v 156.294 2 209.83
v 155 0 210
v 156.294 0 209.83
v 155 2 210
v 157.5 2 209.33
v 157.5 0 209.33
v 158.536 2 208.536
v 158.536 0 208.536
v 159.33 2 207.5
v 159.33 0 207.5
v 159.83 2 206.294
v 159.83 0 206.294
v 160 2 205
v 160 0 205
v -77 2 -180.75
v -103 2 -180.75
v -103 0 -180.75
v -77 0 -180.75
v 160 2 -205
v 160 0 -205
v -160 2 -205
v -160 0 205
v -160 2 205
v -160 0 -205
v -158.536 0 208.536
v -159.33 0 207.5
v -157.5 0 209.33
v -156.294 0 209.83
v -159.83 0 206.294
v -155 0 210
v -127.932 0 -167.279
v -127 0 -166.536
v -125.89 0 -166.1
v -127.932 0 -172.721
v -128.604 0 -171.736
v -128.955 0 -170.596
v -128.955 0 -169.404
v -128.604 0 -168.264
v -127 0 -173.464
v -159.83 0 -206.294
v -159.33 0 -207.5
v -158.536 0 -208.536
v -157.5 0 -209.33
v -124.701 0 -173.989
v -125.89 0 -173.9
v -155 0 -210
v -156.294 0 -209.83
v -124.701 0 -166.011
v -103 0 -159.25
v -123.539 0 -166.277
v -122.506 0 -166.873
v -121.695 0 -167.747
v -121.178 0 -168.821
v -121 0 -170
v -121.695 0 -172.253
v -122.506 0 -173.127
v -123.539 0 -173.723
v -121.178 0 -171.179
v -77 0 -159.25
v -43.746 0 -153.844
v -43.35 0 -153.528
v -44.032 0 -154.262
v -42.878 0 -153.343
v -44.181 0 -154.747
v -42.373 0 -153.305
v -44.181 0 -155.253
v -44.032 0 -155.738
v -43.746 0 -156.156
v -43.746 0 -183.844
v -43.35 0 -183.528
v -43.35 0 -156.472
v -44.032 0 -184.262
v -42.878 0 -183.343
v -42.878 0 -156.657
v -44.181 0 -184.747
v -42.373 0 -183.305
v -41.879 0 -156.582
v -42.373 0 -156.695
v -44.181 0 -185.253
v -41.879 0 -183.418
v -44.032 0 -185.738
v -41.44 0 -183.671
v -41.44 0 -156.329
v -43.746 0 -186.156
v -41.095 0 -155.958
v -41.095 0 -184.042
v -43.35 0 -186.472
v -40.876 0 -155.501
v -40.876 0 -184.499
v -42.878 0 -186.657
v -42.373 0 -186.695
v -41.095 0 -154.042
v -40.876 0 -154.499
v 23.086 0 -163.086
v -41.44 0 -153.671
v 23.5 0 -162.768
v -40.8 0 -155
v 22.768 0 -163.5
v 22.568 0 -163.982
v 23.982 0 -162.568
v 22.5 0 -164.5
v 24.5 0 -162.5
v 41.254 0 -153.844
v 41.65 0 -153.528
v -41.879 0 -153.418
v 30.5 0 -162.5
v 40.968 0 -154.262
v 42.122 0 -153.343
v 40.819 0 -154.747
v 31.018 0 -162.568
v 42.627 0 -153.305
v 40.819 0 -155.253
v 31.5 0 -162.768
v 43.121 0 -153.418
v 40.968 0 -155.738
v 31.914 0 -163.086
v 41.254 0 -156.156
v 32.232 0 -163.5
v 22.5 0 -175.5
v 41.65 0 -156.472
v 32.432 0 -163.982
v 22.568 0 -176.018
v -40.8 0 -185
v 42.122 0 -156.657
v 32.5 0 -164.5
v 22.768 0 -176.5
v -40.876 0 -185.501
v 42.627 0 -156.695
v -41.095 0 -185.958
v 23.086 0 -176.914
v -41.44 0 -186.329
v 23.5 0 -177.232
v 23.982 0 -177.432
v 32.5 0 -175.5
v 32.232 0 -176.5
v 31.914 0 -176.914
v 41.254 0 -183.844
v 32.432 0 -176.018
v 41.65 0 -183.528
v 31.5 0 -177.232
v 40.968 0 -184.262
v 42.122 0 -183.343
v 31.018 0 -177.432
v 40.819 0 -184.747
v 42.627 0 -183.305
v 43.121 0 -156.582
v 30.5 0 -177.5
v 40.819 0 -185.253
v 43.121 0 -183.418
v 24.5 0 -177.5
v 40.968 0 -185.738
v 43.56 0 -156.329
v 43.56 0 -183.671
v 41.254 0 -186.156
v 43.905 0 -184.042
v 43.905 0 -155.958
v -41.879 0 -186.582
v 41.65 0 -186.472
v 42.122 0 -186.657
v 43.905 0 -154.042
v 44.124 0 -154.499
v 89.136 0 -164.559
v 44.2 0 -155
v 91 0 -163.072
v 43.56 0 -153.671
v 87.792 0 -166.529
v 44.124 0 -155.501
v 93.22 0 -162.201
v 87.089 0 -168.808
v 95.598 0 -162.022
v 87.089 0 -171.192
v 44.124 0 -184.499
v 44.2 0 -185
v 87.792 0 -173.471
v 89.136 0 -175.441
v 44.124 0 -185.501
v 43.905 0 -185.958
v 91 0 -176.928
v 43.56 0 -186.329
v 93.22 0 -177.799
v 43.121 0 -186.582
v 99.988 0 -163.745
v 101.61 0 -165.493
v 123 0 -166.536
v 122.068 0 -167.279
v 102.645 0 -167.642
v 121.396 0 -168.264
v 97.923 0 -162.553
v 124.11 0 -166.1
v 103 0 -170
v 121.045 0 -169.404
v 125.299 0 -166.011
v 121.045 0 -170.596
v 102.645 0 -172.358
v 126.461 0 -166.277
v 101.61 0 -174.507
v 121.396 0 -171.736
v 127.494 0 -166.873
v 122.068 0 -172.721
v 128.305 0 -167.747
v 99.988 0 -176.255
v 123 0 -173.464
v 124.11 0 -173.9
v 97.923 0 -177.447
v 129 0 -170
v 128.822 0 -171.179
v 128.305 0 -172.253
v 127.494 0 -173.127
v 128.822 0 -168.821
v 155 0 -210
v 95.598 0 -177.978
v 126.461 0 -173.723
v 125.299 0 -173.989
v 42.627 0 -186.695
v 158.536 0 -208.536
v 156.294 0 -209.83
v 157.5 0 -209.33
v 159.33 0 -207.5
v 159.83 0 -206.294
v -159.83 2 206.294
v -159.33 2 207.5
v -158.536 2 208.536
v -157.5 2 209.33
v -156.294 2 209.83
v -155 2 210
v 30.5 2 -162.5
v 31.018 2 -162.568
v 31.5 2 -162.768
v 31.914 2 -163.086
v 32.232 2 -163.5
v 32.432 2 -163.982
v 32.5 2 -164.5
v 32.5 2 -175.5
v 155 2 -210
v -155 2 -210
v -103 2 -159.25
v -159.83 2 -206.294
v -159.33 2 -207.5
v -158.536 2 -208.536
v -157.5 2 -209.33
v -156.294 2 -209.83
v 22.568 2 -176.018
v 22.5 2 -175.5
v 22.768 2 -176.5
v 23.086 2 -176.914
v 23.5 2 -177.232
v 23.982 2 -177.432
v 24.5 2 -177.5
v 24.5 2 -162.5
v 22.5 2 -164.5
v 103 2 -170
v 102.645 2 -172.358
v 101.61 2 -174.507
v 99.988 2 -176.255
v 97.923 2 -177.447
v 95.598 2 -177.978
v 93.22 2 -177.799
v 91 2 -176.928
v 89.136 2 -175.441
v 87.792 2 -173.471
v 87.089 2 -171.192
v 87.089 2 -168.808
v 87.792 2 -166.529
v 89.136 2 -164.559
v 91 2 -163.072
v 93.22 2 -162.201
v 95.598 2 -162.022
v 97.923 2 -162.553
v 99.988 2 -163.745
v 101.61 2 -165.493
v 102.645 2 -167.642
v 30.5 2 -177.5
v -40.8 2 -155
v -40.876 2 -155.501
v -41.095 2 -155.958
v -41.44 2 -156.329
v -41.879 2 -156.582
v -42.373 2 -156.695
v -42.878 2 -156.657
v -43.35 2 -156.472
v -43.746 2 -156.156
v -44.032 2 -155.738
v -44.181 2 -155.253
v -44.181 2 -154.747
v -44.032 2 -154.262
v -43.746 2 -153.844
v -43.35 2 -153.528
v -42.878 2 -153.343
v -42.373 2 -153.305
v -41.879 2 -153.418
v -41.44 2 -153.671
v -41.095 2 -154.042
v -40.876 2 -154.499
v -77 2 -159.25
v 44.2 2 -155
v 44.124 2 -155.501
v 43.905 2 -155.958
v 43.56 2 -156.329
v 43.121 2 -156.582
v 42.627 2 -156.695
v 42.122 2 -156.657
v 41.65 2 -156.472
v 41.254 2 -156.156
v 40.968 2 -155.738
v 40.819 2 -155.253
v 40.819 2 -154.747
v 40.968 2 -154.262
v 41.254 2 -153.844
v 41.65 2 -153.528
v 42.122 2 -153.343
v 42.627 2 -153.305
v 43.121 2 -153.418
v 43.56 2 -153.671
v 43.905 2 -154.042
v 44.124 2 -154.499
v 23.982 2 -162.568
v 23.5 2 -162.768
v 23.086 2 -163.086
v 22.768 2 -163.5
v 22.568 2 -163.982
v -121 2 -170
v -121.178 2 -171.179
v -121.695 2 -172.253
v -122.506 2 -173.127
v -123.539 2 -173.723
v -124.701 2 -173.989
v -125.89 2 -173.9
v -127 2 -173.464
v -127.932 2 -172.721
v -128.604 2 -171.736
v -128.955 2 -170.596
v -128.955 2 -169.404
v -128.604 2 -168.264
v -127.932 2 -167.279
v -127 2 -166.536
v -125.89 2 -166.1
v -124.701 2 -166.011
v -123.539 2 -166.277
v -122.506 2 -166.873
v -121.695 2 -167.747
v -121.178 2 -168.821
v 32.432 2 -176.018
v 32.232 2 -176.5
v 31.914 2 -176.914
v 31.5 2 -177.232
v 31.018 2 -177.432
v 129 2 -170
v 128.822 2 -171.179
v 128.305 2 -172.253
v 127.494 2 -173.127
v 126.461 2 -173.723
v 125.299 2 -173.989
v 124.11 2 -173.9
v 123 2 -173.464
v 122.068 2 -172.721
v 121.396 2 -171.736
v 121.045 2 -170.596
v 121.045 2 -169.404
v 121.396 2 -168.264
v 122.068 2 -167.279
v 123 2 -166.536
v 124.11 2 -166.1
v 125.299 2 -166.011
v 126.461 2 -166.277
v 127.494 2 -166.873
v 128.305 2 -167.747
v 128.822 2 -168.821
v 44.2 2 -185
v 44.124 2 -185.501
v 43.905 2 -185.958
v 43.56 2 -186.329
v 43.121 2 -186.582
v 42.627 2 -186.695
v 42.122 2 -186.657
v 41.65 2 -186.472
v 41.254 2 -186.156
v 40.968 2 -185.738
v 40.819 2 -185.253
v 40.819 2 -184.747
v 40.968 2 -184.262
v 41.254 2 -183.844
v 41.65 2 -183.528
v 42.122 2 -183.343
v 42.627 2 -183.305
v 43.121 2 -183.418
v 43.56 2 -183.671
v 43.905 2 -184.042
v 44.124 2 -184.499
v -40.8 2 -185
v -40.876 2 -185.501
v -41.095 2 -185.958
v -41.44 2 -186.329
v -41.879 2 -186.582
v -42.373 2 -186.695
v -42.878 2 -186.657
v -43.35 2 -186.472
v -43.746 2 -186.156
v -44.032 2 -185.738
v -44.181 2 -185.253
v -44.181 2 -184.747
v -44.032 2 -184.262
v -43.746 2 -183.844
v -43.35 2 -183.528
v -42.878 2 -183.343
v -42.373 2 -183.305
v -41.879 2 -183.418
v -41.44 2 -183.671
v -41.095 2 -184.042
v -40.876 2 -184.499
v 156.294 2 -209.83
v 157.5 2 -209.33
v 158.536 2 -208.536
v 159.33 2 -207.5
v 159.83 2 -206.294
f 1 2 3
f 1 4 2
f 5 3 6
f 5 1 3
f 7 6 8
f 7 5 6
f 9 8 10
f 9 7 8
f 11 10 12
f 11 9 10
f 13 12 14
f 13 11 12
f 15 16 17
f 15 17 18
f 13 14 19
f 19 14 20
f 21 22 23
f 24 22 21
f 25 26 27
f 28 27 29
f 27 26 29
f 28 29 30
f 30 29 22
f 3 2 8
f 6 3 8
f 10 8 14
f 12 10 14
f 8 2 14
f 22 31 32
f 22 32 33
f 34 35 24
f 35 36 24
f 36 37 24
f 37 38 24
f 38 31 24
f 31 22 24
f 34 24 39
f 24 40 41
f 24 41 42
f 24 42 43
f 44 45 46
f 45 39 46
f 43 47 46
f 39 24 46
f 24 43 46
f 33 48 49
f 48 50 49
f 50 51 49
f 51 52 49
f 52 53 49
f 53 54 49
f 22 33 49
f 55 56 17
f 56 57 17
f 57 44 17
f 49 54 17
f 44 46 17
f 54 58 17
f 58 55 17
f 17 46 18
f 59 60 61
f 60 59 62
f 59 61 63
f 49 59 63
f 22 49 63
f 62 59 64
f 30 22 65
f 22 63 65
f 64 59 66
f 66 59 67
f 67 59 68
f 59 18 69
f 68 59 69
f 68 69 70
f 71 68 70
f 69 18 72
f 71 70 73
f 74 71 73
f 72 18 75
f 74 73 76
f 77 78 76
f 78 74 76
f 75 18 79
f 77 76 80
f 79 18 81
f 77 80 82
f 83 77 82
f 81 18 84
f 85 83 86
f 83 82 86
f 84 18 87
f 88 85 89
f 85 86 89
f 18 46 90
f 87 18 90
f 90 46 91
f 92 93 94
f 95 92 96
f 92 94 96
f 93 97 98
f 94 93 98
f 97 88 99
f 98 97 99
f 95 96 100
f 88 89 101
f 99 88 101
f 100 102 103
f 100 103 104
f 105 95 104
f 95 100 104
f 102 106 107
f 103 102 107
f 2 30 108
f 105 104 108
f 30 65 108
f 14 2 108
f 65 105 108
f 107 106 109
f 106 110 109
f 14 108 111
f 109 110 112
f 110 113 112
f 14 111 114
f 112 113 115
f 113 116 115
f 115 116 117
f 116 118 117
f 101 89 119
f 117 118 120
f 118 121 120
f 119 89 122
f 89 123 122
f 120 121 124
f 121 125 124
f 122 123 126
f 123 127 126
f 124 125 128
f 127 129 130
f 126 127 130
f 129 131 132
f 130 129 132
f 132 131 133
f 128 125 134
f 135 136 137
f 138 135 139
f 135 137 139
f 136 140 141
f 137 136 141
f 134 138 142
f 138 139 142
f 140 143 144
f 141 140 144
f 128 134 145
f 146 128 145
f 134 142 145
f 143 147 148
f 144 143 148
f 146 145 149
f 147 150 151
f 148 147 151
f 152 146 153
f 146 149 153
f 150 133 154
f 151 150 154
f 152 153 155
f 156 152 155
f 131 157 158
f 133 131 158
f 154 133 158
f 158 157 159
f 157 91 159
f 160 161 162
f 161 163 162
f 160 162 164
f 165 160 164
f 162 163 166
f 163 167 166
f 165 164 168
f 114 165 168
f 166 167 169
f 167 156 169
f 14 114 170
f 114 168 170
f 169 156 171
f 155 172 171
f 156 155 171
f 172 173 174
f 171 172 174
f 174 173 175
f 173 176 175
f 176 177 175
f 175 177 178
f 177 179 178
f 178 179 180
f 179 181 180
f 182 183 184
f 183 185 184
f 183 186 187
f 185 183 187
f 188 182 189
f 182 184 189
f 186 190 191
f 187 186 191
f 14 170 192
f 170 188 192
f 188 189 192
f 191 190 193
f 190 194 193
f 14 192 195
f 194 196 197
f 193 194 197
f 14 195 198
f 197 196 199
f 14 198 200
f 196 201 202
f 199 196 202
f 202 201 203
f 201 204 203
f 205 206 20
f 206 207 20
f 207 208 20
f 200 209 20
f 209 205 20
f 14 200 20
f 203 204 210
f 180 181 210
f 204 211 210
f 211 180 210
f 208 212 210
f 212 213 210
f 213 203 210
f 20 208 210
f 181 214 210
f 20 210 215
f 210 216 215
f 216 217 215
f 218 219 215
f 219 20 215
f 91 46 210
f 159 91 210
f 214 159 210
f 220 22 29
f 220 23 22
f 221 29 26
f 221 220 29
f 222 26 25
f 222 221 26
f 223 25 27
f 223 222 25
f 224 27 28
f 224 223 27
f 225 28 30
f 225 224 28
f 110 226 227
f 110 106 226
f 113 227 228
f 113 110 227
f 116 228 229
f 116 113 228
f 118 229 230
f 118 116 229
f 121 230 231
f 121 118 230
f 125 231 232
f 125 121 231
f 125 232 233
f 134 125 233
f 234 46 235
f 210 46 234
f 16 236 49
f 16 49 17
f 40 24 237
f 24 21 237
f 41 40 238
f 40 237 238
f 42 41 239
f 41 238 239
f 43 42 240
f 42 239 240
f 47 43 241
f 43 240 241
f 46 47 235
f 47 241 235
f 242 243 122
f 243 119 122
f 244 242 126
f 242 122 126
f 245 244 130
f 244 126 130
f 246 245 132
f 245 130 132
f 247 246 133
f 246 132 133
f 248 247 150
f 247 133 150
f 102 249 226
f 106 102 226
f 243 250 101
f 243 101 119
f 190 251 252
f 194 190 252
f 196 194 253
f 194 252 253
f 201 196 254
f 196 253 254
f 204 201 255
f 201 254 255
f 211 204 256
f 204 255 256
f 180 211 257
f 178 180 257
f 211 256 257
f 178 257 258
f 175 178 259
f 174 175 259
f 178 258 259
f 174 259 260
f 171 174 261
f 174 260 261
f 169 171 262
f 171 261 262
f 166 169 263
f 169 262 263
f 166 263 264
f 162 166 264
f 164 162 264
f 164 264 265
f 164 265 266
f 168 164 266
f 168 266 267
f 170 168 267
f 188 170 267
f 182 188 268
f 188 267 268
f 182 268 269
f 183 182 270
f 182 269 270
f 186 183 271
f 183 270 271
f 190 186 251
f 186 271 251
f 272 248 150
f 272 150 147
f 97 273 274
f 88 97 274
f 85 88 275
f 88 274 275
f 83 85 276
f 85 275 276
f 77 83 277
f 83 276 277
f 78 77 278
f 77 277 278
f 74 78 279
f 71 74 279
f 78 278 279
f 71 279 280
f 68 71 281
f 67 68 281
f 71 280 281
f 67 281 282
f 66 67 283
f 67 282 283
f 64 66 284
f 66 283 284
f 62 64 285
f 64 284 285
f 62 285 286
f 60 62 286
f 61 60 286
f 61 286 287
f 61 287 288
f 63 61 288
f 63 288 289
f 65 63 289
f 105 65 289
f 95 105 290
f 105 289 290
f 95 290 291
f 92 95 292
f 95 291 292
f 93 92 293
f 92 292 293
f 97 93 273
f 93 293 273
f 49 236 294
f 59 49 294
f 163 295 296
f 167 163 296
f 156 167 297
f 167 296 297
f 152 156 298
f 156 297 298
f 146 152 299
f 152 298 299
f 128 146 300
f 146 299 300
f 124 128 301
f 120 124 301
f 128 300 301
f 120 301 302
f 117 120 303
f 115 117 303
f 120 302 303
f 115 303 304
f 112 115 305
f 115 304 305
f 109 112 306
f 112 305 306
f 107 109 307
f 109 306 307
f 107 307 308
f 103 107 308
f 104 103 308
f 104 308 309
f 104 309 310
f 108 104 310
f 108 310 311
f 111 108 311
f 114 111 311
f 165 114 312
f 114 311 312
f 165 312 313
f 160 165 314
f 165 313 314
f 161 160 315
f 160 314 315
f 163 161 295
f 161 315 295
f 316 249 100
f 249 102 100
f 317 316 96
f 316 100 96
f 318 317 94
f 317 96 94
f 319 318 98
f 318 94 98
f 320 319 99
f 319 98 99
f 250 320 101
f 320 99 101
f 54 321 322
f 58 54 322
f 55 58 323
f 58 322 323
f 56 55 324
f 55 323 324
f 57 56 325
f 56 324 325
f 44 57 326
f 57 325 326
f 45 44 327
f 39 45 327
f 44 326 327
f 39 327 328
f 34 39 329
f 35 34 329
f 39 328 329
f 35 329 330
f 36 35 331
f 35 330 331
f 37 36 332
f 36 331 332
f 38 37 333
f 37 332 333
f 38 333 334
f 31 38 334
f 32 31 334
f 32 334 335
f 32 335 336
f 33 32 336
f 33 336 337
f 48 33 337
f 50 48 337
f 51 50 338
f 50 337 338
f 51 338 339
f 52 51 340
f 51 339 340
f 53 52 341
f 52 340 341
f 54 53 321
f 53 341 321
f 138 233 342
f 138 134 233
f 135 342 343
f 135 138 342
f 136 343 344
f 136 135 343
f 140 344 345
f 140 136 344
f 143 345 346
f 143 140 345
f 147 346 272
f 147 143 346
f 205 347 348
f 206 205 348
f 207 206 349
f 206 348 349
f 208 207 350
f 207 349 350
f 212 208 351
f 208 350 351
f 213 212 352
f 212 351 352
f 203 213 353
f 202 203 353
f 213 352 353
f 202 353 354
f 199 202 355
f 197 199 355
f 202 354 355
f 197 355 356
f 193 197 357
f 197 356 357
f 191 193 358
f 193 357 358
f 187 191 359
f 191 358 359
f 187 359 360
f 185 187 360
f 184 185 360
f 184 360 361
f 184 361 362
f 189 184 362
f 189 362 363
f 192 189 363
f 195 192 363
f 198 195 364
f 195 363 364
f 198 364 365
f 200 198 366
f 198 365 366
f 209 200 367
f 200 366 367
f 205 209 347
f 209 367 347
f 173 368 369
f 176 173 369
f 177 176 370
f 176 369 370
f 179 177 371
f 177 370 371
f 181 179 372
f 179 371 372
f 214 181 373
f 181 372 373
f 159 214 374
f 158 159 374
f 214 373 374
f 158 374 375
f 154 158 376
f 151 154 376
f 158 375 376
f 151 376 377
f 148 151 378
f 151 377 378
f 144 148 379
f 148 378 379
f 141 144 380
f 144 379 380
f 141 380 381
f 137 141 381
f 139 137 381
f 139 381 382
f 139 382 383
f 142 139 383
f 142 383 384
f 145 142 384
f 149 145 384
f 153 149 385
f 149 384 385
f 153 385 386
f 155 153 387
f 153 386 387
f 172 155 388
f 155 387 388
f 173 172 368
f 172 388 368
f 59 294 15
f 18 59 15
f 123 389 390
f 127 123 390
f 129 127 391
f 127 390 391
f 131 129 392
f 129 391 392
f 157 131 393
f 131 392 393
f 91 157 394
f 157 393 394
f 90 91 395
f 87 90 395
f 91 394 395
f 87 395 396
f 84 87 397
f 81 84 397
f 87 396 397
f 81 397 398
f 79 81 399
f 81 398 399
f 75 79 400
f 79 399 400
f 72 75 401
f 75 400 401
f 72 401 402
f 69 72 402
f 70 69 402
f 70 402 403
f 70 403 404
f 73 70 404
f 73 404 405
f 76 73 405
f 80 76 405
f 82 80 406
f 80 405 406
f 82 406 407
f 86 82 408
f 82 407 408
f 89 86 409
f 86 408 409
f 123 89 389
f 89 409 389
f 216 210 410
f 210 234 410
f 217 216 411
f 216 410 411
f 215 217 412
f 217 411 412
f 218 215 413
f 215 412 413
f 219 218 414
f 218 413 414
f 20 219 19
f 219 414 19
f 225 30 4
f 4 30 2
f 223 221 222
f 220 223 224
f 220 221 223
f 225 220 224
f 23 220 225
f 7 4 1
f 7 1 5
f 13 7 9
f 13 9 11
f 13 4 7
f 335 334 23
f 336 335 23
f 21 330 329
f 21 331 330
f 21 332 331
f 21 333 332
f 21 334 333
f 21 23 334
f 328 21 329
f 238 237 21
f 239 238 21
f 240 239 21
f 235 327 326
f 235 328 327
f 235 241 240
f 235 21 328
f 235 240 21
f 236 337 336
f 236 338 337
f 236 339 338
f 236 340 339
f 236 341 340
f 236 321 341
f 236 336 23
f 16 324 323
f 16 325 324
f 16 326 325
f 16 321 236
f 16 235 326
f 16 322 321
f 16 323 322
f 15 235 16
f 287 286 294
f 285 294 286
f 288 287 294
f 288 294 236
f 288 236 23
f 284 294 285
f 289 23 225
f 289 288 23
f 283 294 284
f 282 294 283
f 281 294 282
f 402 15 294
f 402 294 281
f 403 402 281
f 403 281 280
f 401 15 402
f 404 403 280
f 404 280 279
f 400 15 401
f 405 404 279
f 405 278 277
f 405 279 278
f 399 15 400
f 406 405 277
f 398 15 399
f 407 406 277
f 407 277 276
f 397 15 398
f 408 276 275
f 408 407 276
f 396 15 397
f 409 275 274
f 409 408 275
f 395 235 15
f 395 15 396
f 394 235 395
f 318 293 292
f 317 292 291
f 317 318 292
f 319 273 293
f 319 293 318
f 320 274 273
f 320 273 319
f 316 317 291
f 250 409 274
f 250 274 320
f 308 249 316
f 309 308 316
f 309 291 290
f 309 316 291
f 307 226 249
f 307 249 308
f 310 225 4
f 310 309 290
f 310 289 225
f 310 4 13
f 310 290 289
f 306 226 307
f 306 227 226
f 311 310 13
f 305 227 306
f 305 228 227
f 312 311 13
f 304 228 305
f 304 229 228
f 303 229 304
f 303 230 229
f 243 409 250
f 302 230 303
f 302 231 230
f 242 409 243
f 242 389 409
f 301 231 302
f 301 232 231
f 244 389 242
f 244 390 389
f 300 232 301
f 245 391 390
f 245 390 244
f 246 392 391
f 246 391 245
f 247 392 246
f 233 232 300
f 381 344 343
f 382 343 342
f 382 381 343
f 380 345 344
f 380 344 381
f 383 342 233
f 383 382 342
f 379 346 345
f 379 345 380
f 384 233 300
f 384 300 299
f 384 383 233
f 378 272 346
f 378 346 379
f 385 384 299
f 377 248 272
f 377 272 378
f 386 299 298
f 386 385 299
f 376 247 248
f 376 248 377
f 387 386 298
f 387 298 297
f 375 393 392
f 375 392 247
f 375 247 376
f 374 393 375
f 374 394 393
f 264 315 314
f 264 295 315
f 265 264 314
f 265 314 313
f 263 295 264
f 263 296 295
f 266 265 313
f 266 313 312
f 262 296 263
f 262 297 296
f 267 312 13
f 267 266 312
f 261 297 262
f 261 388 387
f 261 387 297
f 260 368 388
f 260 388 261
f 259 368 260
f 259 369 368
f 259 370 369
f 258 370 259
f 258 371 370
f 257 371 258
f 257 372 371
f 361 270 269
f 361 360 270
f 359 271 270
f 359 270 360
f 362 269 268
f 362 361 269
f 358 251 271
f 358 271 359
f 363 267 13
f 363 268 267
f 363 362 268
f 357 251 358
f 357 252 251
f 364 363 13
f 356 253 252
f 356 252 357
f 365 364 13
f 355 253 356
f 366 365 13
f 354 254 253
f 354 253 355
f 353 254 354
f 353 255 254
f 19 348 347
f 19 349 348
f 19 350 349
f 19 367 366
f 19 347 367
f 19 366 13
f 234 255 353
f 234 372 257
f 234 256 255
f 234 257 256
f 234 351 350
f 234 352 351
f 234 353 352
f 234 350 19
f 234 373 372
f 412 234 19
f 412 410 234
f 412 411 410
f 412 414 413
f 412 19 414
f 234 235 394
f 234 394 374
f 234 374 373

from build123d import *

# Parameters (mm, degrees)
SKETCH1_W           = 320
SKETCH1_H           = 420
BOSS_EXTRUDE1_DEPTH = 2
SKETCH3_R           = 1.7
SKETCH3_W           = 10
SKETCH3_H           = 15
CUT_EXTRUDE1_DEPTH  = 2
SKETCH5_R           = 4
SKETCH5_R_2         = 8
SKETCH5_W           = 26
SKETCH5_H           = 21.5
CUT_EXTRUDE2_DEPTH  = 2
FILLET1_R           = 5
FILLET2_R           = 2


with BuildPart() as part:
    # Sketch1 → Boss-Extrude1 (new body)
    with BuildSketch(Plane(origin=(0, 0, 0), x_dir=(1, 0, 0), z_dir=(0, 1, 0))):
        Rectangle(SKETCH1_W, SKETCH1_H)
    extrude(amount=BOSS_EXTRUDE1_DEPTH)

    # Sketch3 → Cut-Extrude1 (cut)
    with BuildSketch(Plane(origin=(0, 2, 0), x_dir=(1, 0, 0), z_dir=(0, 1, 0))):
        with Locations((-42.5, 185)):
            Circle(SKETCH3_R)
        with Locations((42.5, 185)):
            Circle(SKETCH3_R)
        with Locations((42.5, 155)):
            Circle(SKETCH3_R)
        with Locations((-42.5, 155)):
            Circle(SKETCH3_R)
        with Locations((27.5, 170)):
            Rectangle(SKETCH3_W, SKETCH3_H)
    extrude(amount=-CUT_EXTRUDE1_DEPTH, mode=Mode.SUBTRACT)

    # Sketch5 → Cut-Extrude2 (cut)
    with BuildSketch(Plane(origin=(0, 2, 0), x_dir=(1, 0, 0), z_dir=(0, 1, 0))):
        with Locations((-125, 170)):
            Circle(SKETCH5_R)
        with Locations((95, 170)):
            Circle(SKETCH5_R_2)
        with Locations((125, 170)):
            Circle(SKETCH5_R)
        with Locations((-90, 170)):
            Rectangle(SKETCH5_W, SKETCH5_H)
    extrude(amount=-CUT_EXTRUDE2_DEPTH, mode=Mode.SUBTRACT)

    # Fillet1
    fillet1_edges = [part.edges().sort_by_distance(p)[0] for p in [
        (160, 1, 210),
        (-160, 1, 210),
        (-160, 1, -210),
        (160, 1, -210),
    ]]
    fillet(fillet1_edges, radius=FILLET1_R)

    # Fillet2
    fillet2_edges = [part.edges().sort_by_distance(p)[0] for p in [
        (32.5, 1, -162.5),
        (22.5, 1, -162.5),
        (22.5, 1, -177.5),
        (32.5, 1, -177.5),
    ]]
    fillet(fillet2_edges, radius=FILLET2_R)


solid = part.part
